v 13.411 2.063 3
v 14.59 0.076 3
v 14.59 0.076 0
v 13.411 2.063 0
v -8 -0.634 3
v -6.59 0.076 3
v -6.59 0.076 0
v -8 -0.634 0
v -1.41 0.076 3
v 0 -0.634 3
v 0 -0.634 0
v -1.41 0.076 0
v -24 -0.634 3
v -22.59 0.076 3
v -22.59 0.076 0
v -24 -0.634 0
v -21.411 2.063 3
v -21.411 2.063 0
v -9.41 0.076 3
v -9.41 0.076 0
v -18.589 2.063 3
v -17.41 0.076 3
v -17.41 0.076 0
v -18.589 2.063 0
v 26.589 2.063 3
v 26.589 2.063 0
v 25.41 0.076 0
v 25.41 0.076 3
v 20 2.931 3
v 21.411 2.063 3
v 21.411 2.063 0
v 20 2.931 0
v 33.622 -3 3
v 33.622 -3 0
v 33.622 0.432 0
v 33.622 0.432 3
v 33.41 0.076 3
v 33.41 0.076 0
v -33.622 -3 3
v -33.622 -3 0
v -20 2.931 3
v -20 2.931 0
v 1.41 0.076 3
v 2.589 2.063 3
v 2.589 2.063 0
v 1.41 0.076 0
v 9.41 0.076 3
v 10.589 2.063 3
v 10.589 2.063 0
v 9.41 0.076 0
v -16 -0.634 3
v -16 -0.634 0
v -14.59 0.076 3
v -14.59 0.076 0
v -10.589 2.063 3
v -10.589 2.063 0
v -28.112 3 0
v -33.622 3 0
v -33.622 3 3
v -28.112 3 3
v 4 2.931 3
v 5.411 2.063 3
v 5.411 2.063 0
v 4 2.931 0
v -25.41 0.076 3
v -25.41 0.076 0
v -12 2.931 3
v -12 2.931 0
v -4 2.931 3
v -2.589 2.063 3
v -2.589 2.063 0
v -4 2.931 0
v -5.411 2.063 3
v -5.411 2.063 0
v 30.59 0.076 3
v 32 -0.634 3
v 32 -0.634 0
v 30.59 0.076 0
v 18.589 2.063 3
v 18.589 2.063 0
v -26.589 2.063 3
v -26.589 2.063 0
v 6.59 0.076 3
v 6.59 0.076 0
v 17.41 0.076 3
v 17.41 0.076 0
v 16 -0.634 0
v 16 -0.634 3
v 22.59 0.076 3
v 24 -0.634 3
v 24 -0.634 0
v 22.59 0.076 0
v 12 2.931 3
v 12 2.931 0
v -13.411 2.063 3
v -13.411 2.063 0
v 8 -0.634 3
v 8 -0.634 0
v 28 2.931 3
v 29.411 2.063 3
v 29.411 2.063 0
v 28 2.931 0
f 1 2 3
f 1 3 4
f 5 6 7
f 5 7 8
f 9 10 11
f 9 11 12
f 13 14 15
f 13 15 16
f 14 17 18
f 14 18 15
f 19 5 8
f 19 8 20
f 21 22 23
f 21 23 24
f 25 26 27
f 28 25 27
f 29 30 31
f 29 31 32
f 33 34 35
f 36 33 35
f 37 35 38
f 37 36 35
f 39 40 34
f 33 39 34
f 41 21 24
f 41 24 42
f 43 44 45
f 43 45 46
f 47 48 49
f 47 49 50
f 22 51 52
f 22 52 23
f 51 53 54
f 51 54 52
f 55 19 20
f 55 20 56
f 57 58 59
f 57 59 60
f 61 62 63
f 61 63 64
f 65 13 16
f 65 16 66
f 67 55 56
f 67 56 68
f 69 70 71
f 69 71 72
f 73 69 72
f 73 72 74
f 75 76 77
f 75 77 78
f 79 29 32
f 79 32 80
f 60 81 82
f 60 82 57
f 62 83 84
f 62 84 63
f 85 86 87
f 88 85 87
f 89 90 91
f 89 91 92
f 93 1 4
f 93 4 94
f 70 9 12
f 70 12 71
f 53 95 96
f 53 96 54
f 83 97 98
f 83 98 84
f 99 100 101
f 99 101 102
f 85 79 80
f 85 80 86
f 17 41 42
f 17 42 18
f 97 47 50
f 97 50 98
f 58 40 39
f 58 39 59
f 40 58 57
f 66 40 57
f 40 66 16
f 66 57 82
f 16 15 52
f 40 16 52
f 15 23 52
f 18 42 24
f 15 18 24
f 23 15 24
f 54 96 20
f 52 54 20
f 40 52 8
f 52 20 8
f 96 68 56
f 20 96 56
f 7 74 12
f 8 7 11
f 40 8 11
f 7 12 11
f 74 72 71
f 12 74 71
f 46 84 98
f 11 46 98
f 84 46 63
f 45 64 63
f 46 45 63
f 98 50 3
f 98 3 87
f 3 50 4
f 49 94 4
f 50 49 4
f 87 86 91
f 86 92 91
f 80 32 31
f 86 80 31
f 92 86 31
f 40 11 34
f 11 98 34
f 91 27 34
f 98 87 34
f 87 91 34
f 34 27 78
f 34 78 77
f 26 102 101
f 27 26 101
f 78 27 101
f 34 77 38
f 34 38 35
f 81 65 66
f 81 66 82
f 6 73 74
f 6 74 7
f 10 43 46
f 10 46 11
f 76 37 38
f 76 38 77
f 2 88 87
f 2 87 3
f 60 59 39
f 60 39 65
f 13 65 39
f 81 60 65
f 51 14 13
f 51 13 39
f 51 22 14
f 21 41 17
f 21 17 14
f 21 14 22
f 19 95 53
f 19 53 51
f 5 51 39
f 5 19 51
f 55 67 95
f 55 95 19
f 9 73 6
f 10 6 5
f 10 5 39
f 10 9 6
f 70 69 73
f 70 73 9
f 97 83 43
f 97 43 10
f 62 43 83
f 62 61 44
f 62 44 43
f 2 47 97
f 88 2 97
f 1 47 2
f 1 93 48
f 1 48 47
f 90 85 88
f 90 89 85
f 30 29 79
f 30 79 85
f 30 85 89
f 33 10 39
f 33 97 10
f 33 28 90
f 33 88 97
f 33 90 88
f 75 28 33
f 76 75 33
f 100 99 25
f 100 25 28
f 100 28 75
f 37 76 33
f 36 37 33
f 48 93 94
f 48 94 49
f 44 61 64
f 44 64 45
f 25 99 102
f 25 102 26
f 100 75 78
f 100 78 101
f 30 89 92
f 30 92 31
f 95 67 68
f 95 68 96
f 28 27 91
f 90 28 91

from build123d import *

# Parameters (mm, degrees)
SKETCH1_W            = 67.243323526
SKETCH1_H            = 6
BOSS_EXTRUDE1_DEPTH  = 3
CUT_EXTRUDE1_DEPTH   = 34.888289123
LPATTERN1_COUNT      = 4
LPATTERN1_PITCH      = 8
LPATTERN1_COUNT_DIR2 = 6
LPATTERN1_PITCH_DIR2 = 8


with BuildPart() as part:
    # Sketch1 → Boss-Extrude1 (new body)
    with BuildSketch(Plane.XY):
        Rectangle(SKETCH1_W, SKETCH1_H)
    extrude(amount=BOSS_EXTRUDE1_DEPTH)

    # Sketch2 → Cut-Extrude1 (cut, symmetric)
    with BuildSketch(Plane.XY):
        Polygon((0, -0.634469339), (-1.41026817, 0.075896996), (-2.589225858, 2.063475164), (-4.111542835, 3), (-4.981613855, 3.935817872), (0, 4.888597872), (4.981613855, 3.935817872), (4.111542835, 3), (2.589225858, 2.063475164), (1.41026817, 0.075896996), align=None)
    cut_extrude1 = extrude(amount=CUT_EXTRUDE1_DEPTH, both=True, mode=Mode.SUBTRACT)

    # LPattern1: Cut-Extrude1 4 × 6
    with Locations(*[Vector(-1, 0, 0) * (i * LPATTERN1_PITCH) + Vector(1, 0, 0) * (j * LPATTERN1_PITCH_DIR2) for i in range(LPATTERN1_COUNT) for j in range(LPATTERN1_COUNT_DIR2) if (i, j) != (0, 0)]):
        add(cut_extrude1, mode=Mode.SUBTRACT)


solid = part.part
